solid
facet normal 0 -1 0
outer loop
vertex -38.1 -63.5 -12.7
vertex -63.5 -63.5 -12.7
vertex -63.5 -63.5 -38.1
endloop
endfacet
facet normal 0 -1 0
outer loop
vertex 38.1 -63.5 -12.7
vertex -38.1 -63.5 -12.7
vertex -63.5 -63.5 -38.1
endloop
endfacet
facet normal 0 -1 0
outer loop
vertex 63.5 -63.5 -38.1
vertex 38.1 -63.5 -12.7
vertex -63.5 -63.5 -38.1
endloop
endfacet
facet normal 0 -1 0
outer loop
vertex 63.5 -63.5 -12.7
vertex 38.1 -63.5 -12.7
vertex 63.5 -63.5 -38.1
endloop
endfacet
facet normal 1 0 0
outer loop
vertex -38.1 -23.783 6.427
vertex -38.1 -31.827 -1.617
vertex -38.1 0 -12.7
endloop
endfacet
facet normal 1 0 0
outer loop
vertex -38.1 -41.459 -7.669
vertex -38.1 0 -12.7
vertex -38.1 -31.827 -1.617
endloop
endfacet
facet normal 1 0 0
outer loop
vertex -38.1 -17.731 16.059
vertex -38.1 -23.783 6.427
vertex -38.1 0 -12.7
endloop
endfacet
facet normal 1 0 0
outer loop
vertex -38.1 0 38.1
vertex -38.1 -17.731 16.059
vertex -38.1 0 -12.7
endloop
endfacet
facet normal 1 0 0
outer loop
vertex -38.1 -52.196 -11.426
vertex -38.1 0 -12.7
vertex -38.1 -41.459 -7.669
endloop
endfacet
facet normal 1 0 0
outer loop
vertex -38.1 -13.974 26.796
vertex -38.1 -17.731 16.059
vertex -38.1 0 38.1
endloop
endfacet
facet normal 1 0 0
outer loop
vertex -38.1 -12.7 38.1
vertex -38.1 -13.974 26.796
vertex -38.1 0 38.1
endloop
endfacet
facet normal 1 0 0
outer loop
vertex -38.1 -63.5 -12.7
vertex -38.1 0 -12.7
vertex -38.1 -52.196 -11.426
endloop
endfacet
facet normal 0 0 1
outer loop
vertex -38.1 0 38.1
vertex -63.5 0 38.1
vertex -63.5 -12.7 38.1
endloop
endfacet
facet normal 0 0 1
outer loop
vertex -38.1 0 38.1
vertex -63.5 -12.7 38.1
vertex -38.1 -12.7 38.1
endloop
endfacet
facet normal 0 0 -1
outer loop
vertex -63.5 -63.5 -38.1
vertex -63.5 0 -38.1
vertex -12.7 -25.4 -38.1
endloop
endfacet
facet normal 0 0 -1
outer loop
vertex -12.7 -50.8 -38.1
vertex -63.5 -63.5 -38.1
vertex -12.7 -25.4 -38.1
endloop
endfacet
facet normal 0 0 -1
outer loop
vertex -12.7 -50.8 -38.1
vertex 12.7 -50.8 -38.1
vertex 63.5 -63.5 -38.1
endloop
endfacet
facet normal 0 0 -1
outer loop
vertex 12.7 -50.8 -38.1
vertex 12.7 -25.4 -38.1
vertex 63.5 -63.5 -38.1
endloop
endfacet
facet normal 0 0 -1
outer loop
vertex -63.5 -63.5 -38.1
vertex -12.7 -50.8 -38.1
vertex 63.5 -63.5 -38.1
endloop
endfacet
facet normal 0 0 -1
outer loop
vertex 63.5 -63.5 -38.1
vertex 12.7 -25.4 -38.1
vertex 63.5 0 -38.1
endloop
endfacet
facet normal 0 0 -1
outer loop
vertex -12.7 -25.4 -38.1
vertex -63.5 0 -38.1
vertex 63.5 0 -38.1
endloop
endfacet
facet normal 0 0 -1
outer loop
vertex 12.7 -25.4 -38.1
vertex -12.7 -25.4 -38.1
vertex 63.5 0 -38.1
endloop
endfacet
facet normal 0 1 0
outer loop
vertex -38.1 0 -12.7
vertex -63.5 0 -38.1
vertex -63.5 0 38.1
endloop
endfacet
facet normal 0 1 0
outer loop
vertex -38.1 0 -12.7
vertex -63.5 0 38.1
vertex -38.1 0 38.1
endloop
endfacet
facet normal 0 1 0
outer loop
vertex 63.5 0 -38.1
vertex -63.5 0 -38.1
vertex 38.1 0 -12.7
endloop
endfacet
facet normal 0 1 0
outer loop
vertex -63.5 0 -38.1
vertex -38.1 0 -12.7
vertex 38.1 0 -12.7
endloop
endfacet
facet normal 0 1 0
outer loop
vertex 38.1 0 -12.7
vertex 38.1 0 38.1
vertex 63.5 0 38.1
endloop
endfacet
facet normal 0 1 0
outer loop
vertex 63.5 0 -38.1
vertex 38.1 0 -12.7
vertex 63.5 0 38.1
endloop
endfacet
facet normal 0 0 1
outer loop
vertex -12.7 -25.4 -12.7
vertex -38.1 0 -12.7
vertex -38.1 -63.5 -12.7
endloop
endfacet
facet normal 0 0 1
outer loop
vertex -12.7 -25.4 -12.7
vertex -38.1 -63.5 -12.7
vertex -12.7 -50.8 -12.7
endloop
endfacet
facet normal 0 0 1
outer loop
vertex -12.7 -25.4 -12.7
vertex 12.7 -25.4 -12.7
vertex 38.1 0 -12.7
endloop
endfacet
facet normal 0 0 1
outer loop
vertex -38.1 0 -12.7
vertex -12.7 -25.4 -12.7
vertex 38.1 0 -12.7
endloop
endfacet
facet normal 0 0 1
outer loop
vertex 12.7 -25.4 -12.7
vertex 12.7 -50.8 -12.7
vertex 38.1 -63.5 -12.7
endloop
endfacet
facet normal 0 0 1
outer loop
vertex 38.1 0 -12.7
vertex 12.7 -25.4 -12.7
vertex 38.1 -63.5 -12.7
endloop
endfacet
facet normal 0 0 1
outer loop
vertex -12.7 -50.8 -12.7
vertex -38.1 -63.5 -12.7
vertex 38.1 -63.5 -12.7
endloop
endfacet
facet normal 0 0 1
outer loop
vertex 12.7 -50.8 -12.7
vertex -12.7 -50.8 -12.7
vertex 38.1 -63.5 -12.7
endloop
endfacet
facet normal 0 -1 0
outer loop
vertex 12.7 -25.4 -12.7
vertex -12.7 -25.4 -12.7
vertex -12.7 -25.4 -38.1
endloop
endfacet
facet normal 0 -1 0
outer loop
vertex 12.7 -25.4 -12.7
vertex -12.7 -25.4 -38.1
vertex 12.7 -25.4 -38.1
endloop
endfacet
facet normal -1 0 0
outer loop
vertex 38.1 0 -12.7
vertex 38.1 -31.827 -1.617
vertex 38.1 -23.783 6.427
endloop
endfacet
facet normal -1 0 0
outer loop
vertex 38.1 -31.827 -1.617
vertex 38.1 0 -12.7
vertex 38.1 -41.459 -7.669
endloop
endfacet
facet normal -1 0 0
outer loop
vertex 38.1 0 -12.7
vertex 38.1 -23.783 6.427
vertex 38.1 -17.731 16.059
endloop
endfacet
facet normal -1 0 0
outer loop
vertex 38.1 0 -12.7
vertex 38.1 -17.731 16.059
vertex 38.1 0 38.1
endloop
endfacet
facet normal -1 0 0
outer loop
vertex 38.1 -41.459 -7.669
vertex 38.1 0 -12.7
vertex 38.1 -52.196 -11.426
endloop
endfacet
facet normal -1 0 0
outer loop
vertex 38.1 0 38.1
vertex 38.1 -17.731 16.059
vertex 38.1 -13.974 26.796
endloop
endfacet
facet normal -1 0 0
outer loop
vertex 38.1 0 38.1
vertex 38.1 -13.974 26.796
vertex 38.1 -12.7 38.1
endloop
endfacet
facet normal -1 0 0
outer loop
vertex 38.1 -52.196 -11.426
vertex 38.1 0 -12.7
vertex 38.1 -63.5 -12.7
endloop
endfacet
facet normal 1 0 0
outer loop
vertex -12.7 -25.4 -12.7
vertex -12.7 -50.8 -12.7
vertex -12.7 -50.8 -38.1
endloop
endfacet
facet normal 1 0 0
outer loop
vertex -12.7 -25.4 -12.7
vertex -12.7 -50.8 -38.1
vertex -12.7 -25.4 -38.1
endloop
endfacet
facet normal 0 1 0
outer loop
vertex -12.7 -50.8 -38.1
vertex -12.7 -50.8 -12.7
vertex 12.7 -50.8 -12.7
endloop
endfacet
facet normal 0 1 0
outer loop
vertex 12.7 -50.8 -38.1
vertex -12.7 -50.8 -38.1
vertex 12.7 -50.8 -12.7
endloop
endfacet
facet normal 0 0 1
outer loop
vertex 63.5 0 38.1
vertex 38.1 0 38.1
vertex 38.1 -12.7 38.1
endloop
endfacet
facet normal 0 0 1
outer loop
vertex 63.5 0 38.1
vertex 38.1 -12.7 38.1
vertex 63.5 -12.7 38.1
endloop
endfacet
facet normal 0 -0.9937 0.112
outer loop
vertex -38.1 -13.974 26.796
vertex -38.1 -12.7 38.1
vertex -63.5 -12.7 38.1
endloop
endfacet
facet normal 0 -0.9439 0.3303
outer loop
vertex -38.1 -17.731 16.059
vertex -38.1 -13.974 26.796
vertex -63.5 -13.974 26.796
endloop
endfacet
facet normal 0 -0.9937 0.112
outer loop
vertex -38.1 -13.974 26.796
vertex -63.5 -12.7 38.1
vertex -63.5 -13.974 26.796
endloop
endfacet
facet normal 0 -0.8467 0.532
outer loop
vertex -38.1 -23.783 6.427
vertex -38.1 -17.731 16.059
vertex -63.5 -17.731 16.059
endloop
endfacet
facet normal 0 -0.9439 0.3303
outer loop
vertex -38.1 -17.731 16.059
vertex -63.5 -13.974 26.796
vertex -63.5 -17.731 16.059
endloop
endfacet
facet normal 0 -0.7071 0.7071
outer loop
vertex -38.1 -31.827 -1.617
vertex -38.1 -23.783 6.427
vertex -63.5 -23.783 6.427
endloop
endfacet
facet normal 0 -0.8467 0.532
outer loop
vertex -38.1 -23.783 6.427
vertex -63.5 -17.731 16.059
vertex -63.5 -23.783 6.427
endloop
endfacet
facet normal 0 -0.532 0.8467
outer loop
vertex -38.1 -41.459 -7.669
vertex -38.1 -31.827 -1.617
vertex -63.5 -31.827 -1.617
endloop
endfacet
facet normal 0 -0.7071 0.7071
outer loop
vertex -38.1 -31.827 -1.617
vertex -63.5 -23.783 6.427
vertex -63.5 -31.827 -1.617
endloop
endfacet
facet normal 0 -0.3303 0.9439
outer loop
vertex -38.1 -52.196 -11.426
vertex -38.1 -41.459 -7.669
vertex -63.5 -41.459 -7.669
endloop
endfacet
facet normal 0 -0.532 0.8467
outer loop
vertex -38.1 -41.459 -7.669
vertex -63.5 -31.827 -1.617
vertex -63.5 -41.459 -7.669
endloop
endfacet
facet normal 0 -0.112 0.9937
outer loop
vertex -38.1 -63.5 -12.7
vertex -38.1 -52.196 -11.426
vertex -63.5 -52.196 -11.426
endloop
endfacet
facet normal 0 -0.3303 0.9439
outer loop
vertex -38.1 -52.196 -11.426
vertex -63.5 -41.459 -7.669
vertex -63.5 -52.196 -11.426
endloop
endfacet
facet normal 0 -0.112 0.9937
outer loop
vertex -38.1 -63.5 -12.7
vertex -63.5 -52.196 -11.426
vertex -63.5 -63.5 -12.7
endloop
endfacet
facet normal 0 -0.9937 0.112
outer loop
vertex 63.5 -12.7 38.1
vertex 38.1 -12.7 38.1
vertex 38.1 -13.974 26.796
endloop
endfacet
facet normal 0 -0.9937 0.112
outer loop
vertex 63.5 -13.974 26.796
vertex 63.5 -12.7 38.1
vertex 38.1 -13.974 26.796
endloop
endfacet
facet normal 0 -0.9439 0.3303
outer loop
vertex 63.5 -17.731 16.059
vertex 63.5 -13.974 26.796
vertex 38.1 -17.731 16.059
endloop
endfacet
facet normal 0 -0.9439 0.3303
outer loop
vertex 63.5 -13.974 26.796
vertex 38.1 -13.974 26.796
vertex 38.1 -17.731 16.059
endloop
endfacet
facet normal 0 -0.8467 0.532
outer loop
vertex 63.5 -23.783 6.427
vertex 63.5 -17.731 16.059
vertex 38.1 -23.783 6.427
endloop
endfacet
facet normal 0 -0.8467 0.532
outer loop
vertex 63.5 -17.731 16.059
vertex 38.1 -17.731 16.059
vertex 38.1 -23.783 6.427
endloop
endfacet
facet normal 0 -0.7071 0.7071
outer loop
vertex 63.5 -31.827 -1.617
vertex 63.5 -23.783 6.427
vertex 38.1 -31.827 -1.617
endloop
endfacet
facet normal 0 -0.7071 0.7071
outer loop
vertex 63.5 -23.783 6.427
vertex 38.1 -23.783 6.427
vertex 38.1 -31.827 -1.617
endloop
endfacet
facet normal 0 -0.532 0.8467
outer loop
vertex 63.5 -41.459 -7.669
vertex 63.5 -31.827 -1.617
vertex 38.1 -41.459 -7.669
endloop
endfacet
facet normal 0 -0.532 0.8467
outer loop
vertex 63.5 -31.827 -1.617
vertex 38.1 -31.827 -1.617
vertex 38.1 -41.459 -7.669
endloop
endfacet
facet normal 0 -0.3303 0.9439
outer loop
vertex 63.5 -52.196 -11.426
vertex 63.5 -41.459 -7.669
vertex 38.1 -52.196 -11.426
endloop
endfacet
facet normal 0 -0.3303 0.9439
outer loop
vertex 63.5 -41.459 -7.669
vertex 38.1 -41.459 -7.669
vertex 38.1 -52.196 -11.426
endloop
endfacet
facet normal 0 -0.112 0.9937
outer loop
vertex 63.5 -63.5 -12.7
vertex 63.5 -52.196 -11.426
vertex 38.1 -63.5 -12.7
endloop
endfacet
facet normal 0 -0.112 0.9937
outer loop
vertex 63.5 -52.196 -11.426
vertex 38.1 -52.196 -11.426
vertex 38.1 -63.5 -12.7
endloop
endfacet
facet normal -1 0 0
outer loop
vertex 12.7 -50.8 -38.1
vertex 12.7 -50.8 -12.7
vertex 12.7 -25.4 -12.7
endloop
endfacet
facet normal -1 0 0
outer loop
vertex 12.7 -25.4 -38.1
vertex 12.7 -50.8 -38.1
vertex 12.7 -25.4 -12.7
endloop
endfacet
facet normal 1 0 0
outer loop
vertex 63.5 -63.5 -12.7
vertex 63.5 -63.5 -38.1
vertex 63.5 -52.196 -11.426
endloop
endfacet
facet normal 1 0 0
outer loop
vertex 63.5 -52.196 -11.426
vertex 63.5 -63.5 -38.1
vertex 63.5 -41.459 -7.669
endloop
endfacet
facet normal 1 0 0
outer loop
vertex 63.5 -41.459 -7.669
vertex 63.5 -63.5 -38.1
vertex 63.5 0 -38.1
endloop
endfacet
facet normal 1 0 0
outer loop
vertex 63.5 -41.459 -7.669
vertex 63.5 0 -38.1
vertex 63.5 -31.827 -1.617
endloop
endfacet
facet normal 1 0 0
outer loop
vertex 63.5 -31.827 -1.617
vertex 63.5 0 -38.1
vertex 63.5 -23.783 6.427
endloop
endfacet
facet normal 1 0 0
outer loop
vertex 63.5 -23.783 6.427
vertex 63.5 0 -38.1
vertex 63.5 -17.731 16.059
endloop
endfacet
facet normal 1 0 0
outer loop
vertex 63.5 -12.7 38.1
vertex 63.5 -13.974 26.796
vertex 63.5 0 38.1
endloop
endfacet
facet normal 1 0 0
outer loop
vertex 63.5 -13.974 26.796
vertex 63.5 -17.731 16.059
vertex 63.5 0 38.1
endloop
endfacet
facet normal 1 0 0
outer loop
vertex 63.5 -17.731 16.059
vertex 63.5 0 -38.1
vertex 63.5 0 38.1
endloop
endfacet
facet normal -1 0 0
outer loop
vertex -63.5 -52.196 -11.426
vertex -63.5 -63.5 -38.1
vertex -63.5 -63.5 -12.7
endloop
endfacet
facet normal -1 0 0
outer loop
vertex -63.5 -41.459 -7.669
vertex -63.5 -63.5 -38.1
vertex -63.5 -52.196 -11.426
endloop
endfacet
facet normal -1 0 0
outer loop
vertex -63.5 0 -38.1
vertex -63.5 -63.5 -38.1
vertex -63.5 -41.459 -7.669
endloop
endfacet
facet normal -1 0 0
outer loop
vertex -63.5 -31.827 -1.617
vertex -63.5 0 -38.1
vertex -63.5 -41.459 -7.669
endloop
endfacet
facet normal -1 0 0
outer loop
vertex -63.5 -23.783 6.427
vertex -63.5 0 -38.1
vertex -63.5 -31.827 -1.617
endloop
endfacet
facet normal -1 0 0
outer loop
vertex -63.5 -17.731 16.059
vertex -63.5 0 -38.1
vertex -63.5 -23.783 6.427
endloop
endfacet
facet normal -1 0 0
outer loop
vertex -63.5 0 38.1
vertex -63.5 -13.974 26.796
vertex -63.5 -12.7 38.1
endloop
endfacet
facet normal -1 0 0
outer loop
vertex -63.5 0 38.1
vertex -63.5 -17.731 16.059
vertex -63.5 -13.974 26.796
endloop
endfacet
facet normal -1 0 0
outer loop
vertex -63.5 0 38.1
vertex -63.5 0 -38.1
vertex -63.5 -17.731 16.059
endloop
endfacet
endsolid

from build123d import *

# Parameters (mm, degrees)
F0_W     = 127
F0_H     = 76.2
F1_DEPTH = 63.5
F2_W     = 76.2
F2_H     = 50.8
F3_DEPTH = 63.5
F4_R     = 50.8
F5_DEPTH = 132.08
F6_W     = 25.4
F6_H     = 25.4
F7_DEPTH = 25.4


with BuildPart() as f1:
    # F0 (on Front) → F1 (new body)
    with BuildSketch(Plane.XZ):
        Rectangle(F0_W, F0_H)
    extrude(amount=F1_DEPTH)

    # F2 (on face) → F3 (cut)
    with BuildSketch(Plane.XZ.offset(63.5)):
        with Locations((0, 12.7)):
            Rectangle(F2_W, F2_H)
    extrude(amount=-F3_DEPTH, mode=Mode.SUBTRACT)

    # F4 (on face) → F5 (cut)
    with BuildSketch(Plane(origin=(-63.5, 0, 0), x_dir=(0, -1, 0), z_dir=(-1, 0, 0))):
        with Locations((63.5, 38.1)):
            Circle(F4_R)
    extrude(amount=-F5_DEPTH, mode=Mode.SUBTRACT)

    # F6 (on face) → F7 (cut)
    with BuildSketch(Plane.XY.offset(-12.7)):
        with Locations((0, -38.1)):
            Rectangle(F6_W, F6_H)
    extrude(amount=-F7_DEPTH, mode=Mode.SUBTRACT)


solid = f1.part
